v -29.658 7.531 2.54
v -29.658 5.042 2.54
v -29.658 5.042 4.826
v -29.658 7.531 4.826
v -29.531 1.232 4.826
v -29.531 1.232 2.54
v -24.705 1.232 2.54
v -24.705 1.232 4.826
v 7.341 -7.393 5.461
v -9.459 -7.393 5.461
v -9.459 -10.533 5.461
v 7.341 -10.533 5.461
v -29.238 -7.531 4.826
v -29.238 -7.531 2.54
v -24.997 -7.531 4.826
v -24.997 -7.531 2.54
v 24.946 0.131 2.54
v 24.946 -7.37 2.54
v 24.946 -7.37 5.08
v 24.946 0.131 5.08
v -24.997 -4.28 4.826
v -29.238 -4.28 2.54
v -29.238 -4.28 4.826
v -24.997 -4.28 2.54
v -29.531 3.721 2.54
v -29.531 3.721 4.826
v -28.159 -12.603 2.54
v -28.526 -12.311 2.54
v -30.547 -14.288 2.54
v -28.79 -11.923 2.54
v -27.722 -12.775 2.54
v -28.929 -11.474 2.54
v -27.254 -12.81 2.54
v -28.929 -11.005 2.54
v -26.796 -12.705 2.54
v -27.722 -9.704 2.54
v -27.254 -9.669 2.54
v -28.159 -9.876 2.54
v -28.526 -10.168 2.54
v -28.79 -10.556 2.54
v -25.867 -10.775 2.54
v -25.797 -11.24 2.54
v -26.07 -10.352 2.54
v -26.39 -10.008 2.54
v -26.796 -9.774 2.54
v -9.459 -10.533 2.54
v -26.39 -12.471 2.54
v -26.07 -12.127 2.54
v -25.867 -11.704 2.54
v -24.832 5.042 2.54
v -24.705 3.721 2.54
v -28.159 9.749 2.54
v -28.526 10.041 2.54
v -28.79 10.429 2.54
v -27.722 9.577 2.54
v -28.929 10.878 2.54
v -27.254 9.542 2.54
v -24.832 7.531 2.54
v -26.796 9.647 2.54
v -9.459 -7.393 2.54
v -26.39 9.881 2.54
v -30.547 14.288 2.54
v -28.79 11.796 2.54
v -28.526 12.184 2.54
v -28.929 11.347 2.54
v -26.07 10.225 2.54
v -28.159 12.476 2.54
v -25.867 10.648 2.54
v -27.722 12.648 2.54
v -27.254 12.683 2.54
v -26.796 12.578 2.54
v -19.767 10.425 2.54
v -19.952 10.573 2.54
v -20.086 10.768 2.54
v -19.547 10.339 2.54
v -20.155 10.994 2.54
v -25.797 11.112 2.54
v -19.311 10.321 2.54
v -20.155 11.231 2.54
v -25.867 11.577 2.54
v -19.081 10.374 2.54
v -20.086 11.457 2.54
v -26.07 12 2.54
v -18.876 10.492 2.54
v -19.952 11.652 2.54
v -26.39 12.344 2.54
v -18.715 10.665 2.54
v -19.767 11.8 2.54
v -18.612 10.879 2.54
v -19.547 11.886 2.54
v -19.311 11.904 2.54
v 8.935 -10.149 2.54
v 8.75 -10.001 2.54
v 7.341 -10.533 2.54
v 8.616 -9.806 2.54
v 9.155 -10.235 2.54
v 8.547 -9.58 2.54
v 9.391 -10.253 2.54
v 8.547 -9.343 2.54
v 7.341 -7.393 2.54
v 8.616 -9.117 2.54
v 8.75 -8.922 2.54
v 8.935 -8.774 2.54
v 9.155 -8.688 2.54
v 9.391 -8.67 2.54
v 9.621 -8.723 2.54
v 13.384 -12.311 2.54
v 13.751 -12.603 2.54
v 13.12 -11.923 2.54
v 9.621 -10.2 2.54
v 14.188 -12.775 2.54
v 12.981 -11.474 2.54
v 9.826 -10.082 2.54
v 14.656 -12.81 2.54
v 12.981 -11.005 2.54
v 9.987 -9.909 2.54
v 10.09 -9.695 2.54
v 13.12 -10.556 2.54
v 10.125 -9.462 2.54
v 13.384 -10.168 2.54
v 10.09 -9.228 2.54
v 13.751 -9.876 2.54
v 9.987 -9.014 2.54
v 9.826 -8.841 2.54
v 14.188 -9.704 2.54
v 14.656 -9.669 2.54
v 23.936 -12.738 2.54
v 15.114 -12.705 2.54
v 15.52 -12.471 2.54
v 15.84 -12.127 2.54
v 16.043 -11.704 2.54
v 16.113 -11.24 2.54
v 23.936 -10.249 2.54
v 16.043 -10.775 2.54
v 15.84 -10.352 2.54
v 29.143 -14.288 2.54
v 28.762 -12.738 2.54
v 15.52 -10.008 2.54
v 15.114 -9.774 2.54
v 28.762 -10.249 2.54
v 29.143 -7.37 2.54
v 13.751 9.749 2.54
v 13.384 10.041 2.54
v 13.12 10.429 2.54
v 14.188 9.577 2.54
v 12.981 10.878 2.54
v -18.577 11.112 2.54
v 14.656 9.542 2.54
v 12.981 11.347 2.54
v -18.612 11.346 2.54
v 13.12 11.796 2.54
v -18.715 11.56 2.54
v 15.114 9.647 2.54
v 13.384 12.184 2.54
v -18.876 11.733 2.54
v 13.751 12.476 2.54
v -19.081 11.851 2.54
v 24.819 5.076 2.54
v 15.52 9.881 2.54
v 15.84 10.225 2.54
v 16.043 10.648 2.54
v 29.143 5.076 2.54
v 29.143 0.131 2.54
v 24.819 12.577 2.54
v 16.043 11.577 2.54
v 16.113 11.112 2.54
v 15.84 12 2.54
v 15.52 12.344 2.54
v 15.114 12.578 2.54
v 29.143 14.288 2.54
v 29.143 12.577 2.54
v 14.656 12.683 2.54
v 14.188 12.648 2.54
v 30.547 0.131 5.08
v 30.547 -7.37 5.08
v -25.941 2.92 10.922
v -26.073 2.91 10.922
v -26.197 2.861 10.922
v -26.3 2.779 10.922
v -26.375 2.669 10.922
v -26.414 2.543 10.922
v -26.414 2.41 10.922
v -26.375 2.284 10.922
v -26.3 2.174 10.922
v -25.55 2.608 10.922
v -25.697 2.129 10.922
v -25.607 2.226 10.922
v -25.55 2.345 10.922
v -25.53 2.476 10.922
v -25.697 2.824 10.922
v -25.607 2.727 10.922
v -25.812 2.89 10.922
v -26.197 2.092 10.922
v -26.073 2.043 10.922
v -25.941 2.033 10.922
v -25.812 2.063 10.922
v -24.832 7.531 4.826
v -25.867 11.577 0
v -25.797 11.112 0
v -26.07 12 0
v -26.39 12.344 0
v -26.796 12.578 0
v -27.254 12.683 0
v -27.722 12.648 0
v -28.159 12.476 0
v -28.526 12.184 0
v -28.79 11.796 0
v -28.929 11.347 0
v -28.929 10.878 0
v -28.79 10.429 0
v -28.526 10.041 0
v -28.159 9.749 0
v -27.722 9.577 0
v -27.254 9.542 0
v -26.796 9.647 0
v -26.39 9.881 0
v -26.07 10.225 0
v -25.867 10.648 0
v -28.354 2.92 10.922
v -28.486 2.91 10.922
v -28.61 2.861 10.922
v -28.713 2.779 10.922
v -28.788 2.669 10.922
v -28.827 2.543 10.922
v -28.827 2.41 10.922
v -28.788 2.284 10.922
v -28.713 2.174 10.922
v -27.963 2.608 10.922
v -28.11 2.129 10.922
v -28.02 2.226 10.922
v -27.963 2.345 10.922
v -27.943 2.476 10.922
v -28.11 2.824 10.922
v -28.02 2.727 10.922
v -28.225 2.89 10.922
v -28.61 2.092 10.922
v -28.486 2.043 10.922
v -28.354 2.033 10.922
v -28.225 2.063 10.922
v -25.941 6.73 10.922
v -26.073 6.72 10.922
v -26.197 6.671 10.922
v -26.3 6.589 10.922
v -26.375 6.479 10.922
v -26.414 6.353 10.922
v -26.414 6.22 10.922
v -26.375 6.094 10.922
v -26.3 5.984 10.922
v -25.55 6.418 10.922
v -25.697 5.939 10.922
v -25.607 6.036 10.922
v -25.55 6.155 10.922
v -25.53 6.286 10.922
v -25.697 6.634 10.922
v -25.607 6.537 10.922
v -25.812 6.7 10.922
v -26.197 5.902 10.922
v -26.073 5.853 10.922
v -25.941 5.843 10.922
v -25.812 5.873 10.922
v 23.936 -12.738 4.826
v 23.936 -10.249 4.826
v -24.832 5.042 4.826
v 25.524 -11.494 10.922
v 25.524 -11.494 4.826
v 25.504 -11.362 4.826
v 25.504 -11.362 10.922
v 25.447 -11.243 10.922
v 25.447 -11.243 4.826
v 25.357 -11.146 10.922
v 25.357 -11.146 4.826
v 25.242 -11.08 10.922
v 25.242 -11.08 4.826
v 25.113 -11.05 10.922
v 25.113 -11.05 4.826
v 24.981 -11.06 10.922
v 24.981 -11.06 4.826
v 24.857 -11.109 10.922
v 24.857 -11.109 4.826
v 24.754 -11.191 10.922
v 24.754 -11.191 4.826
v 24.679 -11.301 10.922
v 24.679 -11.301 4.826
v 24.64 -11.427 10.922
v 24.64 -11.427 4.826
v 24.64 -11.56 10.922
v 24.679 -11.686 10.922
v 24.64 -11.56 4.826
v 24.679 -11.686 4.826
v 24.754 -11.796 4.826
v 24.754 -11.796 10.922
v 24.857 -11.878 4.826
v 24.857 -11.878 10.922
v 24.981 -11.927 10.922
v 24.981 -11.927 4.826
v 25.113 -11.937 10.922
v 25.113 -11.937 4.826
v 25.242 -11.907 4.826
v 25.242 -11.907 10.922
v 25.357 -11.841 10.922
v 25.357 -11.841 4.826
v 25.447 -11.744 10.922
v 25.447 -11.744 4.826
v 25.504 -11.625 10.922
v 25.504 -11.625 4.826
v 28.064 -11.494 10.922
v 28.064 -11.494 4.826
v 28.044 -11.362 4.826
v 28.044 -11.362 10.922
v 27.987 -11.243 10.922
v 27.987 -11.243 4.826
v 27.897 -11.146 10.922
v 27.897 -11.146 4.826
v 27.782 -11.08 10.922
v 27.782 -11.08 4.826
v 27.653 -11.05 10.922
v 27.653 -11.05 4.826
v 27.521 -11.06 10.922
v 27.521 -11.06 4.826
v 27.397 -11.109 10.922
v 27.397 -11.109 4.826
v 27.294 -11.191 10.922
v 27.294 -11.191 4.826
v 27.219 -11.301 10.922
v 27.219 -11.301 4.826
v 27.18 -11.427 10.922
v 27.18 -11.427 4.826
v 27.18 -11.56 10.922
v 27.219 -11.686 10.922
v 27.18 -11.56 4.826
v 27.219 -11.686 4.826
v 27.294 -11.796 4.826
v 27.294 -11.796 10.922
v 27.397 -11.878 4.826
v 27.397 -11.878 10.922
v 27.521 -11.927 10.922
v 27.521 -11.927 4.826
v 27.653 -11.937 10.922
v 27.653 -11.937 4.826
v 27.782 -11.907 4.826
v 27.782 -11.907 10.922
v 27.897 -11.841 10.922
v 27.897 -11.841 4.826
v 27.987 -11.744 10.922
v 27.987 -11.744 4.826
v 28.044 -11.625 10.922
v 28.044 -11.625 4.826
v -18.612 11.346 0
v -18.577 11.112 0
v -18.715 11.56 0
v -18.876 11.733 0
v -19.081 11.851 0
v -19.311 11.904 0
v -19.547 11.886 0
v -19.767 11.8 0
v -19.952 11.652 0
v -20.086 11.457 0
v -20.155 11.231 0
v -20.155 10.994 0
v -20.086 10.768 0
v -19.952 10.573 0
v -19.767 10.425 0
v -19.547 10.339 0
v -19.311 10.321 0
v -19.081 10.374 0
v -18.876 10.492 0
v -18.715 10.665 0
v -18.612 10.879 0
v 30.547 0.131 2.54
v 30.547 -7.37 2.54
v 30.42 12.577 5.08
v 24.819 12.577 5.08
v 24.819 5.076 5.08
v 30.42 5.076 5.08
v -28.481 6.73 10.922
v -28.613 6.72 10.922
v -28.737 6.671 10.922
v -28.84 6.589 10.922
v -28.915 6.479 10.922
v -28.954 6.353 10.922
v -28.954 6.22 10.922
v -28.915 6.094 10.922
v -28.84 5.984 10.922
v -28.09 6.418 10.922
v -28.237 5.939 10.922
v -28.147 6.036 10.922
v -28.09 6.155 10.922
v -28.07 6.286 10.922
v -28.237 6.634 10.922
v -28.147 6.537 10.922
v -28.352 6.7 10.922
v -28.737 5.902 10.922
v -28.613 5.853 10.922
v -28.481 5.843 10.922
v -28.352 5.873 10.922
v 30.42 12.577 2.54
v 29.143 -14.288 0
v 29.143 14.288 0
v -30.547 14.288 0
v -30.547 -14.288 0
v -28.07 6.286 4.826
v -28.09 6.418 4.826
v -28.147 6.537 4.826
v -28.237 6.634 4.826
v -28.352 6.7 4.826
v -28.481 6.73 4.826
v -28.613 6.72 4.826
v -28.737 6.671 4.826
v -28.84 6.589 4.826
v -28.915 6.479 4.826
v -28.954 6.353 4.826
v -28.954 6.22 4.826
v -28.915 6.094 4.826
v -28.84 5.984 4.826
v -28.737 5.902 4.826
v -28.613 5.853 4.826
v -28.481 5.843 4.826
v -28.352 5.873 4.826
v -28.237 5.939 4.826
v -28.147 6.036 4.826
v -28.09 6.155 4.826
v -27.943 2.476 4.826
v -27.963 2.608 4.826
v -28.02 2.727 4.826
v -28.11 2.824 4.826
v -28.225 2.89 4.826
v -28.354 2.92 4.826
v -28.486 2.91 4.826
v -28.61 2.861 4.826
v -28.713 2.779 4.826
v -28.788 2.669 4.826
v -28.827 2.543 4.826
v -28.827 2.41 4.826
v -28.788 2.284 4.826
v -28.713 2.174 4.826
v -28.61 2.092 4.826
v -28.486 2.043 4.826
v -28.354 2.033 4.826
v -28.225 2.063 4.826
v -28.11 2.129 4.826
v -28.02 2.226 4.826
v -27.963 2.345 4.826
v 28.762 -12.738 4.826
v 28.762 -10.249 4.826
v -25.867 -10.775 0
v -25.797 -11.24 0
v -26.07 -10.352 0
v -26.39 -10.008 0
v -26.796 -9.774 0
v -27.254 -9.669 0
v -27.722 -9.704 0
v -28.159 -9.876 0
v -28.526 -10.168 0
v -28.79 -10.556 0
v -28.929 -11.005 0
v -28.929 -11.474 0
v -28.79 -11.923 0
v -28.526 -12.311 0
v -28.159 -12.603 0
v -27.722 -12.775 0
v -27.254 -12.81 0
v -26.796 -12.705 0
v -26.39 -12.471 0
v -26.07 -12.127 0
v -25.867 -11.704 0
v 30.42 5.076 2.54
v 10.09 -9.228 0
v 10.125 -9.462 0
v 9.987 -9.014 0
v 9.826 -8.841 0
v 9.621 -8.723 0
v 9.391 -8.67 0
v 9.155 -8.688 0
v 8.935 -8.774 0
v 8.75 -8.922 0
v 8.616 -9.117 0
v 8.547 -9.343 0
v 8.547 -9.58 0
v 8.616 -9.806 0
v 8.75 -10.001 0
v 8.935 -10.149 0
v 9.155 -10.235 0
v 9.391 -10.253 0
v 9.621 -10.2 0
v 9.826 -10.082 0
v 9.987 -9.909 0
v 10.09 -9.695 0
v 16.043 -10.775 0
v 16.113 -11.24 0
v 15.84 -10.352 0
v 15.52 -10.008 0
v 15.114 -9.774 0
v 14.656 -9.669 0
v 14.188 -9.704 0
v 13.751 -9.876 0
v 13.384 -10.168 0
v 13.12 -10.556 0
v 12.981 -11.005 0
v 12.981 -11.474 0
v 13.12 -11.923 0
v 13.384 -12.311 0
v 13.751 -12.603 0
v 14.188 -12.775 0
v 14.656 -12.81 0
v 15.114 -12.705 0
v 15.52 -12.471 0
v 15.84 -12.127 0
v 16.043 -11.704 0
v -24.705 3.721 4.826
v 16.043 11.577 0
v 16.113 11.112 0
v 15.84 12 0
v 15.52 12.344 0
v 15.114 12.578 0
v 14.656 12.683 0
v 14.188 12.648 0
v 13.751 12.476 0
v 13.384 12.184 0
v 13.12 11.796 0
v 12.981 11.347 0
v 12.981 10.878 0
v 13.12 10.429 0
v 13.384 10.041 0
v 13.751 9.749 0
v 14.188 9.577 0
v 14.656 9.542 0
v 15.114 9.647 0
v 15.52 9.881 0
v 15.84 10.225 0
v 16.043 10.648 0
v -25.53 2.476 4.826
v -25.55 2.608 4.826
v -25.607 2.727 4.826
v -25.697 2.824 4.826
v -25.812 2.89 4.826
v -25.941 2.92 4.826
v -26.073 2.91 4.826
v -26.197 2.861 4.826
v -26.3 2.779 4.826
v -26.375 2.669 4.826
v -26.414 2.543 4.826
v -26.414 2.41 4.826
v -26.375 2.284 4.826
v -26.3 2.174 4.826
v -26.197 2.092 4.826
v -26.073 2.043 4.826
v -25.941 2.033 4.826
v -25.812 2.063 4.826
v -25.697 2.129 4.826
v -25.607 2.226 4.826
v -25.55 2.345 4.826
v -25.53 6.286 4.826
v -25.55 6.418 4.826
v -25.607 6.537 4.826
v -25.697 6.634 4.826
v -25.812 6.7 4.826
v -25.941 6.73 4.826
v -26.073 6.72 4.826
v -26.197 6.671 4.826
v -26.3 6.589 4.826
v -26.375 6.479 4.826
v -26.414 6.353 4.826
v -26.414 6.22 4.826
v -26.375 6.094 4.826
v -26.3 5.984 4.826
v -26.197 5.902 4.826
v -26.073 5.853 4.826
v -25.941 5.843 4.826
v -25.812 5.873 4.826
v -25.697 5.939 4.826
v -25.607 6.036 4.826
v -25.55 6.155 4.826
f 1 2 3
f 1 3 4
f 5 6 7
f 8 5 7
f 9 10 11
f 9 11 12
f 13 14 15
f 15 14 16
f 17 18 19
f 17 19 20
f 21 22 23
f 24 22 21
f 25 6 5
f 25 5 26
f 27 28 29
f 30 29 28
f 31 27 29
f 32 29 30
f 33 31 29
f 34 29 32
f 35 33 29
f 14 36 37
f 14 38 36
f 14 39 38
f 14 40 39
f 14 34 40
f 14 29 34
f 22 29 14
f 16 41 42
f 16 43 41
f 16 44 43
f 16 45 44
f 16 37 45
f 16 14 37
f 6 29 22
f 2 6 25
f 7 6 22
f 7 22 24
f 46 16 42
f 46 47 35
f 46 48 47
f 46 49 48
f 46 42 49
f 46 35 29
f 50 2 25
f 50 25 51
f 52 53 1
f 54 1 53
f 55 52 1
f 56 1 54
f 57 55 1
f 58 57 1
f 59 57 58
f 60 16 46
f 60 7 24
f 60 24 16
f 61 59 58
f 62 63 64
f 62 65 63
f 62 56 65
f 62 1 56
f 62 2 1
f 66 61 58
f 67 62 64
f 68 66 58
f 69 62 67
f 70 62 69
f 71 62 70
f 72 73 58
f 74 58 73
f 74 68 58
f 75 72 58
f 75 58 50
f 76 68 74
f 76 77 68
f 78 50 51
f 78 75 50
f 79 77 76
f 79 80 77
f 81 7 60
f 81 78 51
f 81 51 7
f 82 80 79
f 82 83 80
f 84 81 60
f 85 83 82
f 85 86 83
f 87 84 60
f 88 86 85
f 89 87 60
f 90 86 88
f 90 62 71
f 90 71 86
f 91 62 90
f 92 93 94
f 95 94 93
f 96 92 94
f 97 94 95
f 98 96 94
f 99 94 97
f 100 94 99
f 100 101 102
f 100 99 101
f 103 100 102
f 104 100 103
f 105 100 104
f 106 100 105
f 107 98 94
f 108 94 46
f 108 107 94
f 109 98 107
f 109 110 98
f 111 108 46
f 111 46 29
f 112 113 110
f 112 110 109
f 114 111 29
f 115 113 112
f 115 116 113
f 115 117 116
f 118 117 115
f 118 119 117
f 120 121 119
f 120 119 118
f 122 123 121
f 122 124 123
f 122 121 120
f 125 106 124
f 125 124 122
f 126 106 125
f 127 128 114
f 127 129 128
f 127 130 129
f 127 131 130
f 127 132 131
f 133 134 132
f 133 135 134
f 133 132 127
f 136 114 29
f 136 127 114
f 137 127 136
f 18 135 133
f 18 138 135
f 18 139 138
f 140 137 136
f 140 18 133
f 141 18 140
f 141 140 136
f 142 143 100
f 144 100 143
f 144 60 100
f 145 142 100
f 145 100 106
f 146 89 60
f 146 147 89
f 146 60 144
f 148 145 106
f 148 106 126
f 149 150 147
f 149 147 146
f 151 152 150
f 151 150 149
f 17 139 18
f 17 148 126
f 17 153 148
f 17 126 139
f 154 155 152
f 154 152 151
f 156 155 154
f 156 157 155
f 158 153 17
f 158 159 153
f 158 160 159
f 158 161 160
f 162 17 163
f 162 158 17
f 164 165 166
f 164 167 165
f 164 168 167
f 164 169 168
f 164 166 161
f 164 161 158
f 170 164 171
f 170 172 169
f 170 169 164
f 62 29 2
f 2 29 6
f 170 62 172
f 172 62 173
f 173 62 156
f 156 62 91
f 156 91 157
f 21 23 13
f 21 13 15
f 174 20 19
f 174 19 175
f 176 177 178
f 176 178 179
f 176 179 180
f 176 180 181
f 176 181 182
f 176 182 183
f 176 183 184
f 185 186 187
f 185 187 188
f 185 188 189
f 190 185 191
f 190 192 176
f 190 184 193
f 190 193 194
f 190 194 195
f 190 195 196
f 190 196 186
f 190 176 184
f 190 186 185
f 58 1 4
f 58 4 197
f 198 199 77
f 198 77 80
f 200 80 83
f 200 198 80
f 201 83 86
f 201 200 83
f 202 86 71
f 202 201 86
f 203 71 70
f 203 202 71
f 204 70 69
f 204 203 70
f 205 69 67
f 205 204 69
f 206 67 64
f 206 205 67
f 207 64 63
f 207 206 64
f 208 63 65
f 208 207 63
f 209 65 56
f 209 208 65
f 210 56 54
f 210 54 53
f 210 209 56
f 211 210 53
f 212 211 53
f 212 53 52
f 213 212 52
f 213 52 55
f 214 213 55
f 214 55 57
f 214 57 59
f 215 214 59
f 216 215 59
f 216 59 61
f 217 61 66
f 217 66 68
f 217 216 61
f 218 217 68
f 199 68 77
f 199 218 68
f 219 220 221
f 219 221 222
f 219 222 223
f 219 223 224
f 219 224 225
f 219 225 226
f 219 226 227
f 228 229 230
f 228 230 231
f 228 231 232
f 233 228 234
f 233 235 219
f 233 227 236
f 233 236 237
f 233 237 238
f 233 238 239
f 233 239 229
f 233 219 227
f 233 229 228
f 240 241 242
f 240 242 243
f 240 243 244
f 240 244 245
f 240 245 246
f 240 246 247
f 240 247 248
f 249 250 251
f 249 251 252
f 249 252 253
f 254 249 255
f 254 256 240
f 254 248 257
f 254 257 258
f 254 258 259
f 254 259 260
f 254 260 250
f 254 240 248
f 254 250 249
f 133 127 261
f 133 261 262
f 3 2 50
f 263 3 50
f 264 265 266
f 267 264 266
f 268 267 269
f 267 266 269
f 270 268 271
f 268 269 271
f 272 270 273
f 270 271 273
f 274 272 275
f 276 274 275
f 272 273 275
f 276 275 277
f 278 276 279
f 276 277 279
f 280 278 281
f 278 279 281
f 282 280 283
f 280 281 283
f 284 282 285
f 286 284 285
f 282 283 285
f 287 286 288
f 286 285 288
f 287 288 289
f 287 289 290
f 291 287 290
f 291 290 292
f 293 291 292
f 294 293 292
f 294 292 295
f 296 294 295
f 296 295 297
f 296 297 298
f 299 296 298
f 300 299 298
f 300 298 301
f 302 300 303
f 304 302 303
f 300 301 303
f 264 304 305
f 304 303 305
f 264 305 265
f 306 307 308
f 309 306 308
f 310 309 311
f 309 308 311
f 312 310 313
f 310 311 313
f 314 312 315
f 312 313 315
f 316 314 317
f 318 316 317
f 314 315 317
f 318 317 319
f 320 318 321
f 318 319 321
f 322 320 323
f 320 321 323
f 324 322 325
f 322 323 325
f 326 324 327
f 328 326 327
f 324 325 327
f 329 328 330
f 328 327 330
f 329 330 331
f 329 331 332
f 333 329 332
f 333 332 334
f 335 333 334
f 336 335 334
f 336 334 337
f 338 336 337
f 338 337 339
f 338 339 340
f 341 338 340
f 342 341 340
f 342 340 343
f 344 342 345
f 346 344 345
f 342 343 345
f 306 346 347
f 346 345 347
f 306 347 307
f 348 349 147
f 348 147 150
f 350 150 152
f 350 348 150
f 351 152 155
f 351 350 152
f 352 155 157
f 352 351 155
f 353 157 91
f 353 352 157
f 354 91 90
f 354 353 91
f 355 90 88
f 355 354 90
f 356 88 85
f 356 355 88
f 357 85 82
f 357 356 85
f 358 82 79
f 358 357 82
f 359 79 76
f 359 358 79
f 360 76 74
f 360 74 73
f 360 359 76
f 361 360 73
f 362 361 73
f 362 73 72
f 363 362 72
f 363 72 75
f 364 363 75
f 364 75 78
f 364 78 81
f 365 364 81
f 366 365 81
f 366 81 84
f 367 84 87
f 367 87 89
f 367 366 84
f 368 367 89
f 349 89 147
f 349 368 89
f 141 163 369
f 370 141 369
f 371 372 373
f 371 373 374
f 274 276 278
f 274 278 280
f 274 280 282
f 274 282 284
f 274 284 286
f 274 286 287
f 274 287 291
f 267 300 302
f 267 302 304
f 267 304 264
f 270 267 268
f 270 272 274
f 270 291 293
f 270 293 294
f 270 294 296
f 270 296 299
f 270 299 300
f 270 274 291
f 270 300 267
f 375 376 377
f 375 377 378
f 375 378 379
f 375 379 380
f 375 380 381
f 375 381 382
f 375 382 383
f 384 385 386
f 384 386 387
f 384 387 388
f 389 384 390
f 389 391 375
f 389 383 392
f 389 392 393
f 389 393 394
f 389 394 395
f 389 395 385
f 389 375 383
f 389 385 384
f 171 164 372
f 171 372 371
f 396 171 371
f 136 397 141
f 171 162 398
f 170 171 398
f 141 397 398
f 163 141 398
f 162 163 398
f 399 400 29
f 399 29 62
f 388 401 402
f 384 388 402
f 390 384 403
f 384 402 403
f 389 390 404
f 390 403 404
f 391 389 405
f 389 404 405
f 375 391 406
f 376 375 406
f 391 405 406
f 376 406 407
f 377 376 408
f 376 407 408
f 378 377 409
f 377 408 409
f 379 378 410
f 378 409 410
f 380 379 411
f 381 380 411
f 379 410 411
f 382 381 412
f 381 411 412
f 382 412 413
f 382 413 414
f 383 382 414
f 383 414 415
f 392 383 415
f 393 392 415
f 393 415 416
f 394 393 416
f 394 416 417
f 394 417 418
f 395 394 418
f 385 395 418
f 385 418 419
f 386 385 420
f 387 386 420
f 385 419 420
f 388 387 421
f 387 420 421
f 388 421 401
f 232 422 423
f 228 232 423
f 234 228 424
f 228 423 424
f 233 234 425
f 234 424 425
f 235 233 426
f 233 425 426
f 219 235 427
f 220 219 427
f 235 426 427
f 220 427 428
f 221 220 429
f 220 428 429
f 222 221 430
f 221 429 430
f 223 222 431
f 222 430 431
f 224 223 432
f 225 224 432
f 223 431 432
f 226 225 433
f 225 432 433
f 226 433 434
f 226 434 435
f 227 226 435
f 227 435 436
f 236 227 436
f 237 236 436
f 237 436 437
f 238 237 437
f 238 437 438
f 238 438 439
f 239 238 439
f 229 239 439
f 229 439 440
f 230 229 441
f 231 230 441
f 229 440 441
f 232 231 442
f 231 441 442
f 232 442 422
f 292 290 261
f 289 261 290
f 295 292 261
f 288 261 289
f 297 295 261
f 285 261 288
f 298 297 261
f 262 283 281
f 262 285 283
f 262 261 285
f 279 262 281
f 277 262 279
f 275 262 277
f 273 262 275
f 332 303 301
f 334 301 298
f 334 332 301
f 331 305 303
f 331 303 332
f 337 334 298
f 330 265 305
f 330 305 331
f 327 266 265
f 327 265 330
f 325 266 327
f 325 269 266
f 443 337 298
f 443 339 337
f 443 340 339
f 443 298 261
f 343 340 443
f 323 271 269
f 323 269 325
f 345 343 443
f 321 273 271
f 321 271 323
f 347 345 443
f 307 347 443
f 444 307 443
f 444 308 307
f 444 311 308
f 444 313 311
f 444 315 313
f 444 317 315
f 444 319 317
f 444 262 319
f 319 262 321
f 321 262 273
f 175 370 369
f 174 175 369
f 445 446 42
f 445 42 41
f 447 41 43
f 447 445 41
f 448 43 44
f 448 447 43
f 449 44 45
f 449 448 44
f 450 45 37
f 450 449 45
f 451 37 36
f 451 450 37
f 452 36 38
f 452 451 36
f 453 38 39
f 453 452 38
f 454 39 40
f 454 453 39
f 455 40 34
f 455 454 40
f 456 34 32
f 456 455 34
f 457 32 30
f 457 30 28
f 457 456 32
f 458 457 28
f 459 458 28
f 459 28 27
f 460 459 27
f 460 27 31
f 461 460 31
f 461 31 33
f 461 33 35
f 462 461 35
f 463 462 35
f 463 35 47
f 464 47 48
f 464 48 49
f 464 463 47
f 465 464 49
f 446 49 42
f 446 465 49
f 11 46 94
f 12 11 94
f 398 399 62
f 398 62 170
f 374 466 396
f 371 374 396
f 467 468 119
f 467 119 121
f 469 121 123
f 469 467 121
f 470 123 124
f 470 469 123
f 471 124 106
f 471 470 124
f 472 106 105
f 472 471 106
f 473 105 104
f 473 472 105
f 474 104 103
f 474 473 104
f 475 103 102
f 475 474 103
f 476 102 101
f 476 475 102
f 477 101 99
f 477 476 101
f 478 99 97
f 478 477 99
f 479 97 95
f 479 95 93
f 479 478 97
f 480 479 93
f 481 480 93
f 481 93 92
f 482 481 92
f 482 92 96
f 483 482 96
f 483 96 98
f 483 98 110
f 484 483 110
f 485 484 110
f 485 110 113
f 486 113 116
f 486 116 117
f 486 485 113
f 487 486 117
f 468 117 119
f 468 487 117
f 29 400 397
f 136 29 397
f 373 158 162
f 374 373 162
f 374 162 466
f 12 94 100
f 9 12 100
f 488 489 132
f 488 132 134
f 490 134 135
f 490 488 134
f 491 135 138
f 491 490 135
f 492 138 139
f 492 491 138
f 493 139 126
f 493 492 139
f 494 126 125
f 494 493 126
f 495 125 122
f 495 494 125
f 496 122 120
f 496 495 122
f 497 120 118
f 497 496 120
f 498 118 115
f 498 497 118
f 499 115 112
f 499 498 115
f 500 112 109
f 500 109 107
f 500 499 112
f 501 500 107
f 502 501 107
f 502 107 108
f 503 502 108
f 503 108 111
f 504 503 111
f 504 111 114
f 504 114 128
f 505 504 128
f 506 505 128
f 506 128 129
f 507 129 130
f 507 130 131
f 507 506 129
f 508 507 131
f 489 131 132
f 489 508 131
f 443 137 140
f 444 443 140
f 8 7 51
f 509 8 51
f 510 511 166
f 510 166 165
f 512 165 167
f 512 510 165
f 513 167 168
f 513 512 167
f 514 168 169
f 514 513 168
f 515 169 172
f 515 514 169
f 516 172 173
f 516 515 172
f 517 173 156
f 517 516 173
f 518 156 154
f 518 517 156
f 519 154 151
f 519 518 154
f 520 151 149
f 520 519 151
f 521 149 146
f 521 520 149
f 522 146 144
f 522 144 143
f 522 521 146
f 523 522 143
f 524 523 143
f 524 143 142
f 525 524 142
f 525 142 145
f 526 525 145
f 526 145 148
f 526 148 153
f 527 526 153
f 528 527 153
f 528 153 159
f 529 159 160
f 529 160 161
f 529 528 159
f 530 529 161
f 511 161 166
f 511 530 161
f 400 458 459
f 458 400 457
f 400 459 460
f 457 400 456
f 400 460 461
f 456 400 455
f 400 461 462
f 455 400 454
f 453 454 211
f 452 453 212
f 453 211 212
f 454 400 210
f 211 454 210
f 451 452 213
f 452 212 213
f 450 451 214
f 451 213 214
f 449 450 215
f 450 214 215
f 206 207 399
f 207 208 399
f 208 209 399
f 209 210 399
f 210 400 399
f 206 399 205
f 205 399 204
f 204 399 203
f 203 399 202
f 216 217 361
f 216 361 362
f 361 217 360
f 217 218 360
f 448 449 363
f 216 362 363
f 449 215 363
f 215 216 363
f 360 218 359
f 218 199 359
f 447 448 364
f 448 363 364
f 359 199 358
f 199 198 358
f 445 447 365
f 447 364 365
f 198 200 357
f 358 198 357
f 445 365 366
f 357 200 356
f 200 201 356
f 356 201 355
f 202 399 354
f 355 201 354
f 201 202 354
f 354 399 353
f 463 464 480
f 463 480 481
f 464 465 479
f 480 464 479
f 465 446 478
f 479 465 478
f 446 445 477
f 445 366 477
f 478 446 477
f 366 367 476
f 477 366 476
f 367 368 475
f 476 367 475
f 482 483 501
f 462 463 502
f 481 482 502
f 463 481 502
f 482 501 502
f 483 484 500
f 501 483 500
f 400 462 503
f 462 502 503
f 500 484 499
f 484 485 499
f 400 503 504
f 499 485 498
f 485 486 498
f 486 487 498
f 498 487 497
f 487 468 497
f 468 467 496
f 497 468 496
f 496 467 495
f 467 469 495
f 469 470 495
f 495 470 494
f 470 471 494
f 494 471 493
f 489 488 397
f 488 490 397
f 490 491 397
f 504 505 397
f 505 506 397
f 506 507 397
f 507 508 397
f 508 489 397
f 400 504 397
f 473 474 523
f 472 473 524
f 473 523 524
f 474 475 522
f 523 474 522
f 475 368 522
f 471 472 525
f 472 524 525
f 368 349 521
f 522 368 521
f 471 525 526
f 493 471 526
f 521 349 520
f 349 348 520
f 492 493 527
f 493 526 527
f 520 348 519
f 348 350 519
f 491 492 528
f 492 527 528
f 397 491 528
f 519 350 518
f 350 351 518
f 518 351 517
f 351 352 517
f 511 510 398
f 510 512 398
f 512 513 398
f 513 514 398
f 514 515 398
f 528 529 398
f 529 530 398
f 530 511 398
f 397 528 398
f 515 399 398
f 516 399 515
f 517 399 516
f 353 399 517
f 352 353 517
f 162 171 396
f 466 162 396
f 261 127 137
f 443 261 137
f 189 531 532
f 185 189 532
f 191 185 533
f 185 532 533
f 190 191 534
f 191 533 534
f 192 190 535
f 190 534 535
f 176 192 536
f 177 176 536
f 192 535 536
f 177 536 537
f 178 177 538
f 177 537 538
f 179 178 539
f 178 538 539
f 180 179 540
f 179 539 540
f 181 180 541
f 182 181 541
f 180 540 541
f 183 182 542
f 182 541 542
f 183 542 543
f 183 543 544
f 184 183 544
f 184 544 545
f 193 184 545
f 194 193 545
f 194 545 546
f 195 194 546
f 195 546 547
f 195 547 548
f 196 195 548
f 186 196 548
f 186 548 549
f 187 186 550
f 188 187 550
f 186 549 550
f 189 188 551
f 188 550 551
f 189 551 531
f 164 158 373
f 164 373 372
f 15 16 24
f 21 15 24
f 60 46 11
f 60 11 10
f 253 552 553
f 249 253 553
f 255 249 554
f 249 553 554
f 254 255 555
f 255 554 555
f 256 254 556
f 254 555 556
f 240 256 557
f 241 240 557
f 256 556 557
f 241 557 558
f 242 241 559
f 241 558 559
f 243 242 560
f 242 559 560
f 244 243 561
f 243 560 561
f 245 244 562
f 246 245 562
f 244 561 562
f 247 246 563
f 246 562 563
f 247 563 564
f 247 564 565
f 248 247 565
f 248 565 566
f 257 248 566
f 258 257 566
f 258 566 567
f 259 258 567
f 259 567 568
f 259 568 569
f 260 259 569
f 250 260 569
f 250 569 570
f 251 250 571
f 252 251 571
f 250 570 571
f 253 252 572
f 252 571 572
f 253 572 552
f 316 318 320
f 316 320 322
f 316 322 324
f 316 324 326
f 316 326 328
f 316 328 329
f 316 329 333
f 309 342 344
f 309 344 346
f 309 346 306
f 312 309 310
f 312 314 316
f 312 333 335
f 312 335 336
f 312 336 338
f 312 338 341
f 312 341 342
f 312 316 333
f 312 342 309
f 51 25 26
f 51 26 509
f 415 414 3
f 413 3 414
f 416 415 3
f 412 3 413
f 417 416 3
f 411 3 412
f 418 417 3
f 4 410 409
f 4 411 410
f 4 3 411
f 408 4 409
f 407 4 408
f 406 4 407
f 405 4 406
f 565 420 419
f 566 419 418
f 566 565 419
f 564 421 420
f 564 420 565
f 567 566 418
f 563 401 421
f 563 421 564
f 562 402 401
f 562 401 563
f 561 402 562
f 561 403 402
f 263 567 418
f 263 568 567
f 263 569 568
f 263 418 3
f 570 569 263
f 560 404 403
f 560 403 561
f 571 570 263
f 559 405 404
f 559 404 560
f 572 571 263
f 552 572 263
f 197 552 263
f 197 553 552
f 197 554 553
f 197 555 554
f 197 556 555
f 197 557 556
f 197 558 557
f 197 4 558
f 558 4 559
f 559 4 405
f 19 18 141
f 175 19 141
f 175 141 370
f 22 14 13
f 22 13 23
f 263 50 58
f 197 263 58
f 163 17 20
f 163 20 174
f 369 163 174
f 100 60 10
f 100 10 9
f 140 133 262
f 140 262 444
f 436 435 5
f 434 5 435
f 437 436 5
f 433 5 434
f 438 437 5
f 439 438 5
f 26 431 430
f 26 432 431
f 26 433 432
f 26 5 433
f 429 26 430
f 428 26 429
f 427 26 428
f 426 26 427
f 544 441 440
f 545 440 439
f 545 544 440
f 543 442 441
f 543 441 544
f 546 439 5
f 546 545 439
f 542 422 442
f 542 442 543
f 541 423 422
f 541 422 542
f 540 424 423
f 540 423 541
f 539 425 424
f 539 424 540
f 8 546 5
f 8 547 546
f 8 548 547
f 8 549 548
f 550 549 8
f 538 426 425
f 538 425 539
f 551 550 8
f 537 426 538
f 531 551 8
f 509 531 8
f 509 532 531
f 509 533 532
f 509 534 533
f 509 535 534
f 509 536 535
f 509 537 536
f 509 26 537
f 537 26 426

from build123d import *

# Parameters (mm, degrees)
F1_W      = 59.69
F1_H      = 28.575
F1_R      = 1.5748
F1_R_2    = 0.79375
F2_DEPTH  = 2.54
F3_W      = 5.600192
F3_H      = 7.500214
F4_DEPTH  = 2.54
F5_W      = 16.800018
F5_H      = 3.139999
F6_DEPTH  = 2.921
F7_W      = 4.826
F7_H      = 2.4892
F7_W_2    = 4.2418
F7_H_2    = 3.2512
F8_DEPTH  = 2.286
F9_R      = 0.4445
F10_DEPTH = 6.096


with BuildPart() as f2:
    # F1 (on Top) → F2 (new body)
    with BuildSketch(Plane.XY):
        with Locations((-0.701548, 0)):
            Rectangle(F1_W, F1_H)
        with Locations((-27.371548, -11.2395)):
            Circle(F1_R, mode=Mode.SUBTRACT)
        with Locations((9.331452, -9.4615)):
            Circle(F1_R_2, mode=Mode.SUBTRACT)
        with Locations((14.538452, -11.2395)):
            Circle(F1_R, mode=Mode.SUBTRACT)
        with Locations((-27.371548, 11.1125)):
            Circle(F1_R, mode=Mode.SUBTRACT)
        with Locations((-19.370548, 11.1125)):
            Circle(F1_R_2, mode=Mode.SUBTRACT)
        with Locations((14.538452, 11.1125)):
            Circle(F1_R, mode=Mode.SUBTRACT)
    extrude(amount=F2_DEPTH)

    # F3 (on face) → F4 (join)
    with BuildSketch(Plane.XY.offset(2.54)):
        with Locations((27.619452, 8.8265)):
            Rectangle(F3_W, F3_H)
        with Locations((27.746452, -3.6195)):
            Rectangle(F3_W, F3_H)
    extrude(amount=F4_DEPTH)

    # F5 (on face) → F6 (join)
    with BuildSketch(Plane.XY.offset(2.54)):
        with Locations((-1.058545, -8.963304)):
            Rectangle(F5_W, F5_H)
    extrude(amount=F6_DEPTH)

    # F7 (on face) → F8 (join)
    with BuildSketch(Plane.XY.offset(2.54)):
        with Locations((26.349452, -11.4935)):
            Rectangle(F7_W, F7_H)
        with Locations((-27.244548, 6.2865)):
            Rectangle(F7_W, F7_H)
        with Locations((-27.117548, 2.4765)):
            Rectangle(F7_W, F7_H)
        with Locations((-27.117548, -5.9055)):
            Rectangle(F7_W_2, F7_H_2)
    extrude(amount=F8_DEPTH)

    # F9 (on face) → F10 (join)
    with BuildSketch(Plane.XY.offset(4.826)):
        with Locations((-28.514548, 6.2865)):
            Circle(F9_R)
        with Locations((-25.974548, 6.2865)):
            Circle(F9_R)
        with Locations((-28.387548, 2.4765)):
            Circle(F9_R)
        with Locations((-25.974548, 2.4765)):
            Circle(F9_R)
        with Locations((27.619452, -11.4935)):
            Circle(F9_R)
        with Locations((25.079452, -11.4935)):
            Circle(F9_R)
    extrude(amount=F10_DEPTH)


solid = f2.part
